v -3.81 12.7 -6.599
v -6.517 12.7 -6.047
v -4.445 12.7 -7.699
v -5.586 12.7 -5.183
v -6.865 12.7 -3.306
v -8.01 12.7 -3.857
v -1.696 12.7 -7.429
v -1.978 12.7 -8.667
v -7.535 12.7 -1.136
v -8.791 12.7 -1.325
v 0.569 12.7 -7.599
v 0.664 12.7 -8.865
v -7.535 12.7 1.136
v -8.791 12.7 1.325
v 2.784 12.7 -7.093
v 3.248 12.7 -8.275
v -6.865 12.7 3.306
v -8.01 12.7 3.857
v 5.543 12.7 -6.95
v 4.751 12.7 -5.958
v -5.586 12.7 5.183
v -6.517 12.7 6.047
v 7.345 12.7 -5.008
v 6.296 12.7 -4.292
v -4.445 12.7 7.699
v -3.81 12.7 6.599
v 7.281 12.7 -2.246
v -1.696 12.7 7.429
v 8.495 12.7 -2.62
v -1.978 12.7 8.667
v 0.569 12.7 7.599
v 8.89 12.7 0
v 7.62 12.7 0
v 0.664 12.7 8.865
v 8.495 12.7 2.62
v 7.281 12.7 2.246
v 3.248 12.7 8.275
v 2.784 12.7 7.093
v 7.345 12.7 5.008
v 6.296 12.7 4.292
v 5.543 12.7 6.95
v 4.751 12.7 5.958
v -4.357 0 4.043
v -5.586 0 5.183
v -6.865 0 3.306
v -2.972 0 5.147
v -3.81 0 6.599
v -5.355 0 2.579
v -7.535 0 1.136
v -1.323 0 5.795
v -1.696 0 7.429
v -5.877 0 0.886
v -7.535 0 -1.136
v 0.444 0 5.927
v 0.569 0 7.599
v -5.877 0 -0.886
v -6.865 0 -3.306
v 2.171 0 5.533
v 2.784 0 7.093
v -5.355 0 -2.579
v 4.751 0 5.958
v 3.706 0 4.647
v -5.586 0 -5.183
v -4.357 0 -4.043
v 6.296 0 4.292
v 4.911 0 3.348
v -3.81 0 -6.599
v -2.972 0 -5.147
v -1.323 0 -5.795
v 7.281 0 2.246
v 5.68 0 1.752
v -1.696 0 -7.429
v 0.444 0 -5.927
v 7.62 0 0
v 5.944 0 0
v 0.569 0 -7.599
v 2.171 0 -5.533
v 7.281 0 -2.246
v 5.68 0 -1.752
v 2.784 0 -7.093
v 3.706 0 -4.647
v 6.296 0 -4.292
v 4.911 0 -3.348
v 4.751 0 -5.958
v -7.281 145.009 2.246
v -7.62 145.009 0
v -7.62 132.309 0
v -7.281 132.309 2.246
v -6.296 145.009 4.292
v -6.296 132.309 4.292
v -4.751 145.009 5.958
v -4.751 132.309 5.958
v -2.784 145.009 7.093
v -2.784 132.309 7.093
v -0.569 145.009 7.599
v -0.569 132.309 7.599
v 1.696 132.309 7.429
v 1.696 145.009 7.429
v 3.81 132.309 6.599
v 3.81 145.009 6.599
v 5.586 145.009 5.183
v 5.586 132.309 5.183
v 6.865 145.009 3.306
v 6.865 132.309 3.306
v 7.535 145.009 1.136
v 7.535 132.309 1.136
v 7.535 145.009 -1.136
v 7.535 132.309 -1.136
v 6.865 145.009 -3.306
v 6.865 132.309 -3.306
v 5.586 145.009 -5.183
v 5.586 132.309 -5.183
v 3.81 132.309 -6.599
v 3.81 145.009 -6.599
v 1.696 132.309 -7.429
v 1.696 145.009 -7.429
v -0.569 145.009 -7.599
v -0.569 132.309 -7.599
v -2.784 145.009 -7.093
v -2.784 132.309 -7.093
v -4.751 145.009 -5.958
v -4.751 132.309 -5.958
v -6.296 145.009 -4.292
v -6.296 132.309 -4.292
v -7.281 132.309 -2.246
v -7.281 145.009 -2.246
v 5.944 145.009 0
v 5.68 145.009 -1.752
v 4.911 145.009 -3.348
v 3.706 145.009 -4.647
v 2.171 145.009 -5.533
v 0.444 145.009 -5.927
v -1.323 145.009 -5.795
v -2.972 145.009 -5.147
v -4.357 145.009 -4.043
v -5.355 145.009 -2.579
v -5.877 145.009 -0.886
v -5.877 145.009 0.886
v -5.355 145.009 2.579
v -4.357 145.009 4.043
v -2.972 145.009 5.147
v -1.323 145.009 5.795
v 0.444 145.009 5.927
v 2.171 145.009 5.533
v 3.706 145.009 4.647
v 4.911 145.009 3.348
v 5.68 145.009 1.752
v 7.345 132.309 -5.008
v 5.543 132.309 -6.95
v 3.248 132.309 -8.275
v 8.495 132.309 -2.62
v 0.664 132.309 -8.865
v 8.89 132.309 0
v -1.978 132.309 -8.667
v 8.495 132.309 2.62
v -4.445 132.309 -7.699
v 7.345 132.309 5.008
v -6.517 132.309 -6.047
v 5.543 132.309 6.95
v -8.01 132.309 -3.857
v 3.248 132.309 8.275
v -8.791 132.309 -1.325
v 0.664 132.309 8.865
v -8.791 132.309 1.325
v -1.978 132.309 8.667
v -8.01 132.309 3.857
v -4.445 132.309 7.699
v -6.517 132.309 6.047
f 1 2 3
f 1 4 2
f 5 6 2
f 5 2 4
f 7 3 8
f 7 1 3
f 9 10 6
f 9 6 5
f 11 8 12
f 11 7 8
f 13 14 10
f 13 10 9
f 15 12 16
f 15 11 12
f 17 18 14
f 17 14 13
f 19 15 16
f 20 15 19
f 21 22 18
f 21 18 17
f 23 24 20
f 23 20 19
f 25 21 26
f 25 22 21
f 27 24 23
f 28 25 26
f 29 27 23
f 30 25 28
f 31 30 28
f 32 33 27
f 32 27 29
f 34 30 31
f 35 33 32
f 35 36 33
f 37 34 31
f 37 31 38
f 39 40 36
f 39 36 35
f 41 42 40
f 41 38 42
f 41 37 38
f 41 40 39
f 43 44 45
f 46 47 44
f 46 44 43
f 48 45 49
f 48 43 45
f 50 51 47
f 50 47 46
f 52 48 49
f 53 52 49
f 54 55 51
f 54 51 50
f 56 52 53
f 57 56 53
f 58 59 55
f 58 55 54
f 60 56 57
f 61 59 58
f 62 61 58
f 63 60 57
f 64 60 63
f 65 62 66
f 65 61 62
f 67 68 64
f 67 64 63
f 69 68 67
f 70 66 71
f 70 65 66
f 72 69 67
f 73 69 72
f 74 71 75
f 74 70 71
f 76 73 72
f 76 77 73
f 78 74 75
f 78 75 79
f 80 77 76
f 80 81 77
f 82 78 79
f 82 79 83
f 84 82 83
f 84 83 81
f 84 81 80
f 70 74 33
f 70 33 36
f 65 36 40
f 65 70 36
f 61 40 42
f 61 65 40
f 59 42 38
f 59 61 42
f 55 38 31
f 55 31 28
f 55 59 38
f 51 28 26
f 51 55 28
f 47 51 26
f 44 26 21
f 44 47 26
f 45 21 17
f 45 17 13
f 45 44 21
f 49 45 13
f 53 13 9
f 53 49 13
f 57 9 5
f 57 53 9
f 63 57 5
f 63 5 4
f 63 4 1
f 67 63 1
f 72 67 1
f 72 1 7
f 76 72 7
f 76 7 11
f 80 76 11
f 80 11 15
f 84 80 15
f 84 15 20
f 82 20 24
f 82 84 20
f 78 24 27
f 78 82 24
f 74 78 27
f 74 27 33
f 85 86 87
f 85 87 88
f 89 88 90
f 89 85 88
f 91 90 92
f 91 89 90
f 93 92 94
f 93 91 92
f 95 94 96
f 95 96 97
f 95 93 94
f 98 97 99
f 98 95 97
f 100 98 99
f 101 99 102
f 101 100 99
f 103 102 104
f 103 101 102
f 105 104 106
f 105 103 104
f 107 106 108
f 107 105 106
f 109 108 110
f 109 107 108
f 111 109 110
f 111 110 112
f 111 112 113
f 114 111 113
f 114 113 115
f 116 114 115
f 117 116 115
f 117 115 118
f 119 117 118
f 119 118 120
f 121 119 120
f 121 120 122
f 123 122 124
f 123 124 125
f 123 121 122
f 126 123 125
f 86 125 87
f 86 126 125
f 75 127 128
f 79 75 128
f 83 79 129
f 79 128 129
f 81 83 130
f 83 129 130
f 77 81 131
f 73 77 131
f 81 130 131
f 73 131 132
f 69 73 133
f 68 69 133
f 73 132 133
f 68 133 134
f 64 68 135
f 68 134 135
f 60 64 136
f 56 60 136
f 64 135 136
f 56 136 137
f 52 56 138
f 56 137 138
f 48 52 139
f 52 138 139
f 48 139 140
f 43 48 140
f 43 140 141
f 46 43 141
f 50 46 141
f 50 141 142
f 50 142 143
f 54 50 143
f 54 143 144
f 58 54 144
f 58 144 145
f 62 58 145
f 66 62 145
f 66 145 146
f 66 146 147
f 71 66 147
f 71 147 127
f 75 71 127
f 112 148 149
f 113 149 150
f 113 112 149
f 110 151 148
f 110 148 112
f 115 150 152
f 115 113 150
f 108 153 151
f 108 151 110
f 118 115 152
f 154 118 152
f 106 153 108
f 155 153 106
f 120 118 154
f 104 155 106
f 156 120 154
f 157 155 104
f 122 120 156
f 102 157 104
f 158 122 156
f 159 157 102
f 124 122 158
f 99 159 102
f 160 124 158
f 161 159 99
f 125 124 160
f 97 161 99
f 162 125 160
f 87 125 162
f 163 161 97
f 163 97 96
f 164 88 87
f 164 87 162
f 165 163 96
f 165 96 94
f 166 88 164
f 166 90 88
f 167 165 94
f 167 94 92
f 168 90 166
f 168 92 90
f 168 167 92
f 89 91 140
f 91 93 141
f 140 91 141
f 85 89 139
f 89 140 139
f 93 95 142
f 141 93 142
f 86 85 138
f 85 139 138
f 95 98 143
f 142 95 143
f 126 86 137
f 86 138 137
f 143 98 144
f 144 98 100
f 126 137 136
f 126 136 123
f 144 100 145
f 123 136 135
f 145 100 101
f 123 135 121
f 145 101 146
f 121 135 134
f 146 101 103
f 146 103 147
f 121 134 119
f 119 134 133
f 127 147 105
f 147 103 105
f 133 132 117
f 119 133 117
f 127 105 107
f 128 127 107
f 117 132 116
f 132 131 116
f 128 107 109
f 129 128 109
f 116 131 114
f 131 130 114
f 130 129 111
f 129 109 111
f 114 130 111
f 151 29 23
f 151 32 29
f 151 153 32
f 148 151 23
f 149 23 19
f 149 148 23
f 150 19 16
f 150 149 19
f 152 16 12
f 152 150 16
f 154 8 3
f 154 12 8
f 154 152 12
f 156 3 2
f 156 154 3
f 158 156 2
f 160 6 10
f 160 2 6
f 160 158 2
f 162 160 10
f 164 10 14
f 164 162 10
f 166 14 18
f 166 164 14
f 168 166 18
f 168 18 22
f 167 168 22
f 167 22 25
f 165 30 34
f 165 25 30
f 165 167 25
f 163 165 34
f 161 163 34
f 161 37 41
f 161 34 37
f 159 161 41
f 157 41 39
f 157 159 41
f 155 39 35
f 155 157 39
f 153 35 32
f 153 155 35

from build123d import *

# Parameters (mm, degrees)
F1_R     = 8.89
F1_R_2   = 5.9436
F3_R     = 8.89
F3_R_2   = 7.62
F4_DEPTH = 12.7
F5_R     = 8.89
F5_R_2   = 7.62
F6_DEPTH = 12.7


with BuildPart() as f2:
    # F2: sweep along a path in F0
    with BuildLine(Plane.XY) as f2_path:
        Line((0, 0), (0, 145.0086))
    # F1 (on Front) → F2 (sweep)
    with BuildSketch(Plane.XZ):
        Circle(F1_R)
        Circle(F1_R_2, mode=Mode.SUBTRACT)
    sweep(path=f2_path.line)

    # F3 (on face) → F4 (cut)
    with BuildSketch(Plane(origin=(0, 145.0086, 0), x_dir=(-1, 0, 0), z_dir=(0, 1, 0))):
        Circle(F3_R)
        Circle(F3_R_2, mode=Mode.SUBTRACT)
    extrude(amount=-F4_DEPTH, mode=Mode.SUBTRACT)

    # F5 (on face) → F6 (cut)
    with BuildSketch(Plane.XZ):
        Circle(F5_R)
        Circle(F5_R_2, mode=Mode.SUBTRACT)
    extrude(amount=-F6_DEPTH, mode=Mode.SUBTRACT)


solid = f2.part
